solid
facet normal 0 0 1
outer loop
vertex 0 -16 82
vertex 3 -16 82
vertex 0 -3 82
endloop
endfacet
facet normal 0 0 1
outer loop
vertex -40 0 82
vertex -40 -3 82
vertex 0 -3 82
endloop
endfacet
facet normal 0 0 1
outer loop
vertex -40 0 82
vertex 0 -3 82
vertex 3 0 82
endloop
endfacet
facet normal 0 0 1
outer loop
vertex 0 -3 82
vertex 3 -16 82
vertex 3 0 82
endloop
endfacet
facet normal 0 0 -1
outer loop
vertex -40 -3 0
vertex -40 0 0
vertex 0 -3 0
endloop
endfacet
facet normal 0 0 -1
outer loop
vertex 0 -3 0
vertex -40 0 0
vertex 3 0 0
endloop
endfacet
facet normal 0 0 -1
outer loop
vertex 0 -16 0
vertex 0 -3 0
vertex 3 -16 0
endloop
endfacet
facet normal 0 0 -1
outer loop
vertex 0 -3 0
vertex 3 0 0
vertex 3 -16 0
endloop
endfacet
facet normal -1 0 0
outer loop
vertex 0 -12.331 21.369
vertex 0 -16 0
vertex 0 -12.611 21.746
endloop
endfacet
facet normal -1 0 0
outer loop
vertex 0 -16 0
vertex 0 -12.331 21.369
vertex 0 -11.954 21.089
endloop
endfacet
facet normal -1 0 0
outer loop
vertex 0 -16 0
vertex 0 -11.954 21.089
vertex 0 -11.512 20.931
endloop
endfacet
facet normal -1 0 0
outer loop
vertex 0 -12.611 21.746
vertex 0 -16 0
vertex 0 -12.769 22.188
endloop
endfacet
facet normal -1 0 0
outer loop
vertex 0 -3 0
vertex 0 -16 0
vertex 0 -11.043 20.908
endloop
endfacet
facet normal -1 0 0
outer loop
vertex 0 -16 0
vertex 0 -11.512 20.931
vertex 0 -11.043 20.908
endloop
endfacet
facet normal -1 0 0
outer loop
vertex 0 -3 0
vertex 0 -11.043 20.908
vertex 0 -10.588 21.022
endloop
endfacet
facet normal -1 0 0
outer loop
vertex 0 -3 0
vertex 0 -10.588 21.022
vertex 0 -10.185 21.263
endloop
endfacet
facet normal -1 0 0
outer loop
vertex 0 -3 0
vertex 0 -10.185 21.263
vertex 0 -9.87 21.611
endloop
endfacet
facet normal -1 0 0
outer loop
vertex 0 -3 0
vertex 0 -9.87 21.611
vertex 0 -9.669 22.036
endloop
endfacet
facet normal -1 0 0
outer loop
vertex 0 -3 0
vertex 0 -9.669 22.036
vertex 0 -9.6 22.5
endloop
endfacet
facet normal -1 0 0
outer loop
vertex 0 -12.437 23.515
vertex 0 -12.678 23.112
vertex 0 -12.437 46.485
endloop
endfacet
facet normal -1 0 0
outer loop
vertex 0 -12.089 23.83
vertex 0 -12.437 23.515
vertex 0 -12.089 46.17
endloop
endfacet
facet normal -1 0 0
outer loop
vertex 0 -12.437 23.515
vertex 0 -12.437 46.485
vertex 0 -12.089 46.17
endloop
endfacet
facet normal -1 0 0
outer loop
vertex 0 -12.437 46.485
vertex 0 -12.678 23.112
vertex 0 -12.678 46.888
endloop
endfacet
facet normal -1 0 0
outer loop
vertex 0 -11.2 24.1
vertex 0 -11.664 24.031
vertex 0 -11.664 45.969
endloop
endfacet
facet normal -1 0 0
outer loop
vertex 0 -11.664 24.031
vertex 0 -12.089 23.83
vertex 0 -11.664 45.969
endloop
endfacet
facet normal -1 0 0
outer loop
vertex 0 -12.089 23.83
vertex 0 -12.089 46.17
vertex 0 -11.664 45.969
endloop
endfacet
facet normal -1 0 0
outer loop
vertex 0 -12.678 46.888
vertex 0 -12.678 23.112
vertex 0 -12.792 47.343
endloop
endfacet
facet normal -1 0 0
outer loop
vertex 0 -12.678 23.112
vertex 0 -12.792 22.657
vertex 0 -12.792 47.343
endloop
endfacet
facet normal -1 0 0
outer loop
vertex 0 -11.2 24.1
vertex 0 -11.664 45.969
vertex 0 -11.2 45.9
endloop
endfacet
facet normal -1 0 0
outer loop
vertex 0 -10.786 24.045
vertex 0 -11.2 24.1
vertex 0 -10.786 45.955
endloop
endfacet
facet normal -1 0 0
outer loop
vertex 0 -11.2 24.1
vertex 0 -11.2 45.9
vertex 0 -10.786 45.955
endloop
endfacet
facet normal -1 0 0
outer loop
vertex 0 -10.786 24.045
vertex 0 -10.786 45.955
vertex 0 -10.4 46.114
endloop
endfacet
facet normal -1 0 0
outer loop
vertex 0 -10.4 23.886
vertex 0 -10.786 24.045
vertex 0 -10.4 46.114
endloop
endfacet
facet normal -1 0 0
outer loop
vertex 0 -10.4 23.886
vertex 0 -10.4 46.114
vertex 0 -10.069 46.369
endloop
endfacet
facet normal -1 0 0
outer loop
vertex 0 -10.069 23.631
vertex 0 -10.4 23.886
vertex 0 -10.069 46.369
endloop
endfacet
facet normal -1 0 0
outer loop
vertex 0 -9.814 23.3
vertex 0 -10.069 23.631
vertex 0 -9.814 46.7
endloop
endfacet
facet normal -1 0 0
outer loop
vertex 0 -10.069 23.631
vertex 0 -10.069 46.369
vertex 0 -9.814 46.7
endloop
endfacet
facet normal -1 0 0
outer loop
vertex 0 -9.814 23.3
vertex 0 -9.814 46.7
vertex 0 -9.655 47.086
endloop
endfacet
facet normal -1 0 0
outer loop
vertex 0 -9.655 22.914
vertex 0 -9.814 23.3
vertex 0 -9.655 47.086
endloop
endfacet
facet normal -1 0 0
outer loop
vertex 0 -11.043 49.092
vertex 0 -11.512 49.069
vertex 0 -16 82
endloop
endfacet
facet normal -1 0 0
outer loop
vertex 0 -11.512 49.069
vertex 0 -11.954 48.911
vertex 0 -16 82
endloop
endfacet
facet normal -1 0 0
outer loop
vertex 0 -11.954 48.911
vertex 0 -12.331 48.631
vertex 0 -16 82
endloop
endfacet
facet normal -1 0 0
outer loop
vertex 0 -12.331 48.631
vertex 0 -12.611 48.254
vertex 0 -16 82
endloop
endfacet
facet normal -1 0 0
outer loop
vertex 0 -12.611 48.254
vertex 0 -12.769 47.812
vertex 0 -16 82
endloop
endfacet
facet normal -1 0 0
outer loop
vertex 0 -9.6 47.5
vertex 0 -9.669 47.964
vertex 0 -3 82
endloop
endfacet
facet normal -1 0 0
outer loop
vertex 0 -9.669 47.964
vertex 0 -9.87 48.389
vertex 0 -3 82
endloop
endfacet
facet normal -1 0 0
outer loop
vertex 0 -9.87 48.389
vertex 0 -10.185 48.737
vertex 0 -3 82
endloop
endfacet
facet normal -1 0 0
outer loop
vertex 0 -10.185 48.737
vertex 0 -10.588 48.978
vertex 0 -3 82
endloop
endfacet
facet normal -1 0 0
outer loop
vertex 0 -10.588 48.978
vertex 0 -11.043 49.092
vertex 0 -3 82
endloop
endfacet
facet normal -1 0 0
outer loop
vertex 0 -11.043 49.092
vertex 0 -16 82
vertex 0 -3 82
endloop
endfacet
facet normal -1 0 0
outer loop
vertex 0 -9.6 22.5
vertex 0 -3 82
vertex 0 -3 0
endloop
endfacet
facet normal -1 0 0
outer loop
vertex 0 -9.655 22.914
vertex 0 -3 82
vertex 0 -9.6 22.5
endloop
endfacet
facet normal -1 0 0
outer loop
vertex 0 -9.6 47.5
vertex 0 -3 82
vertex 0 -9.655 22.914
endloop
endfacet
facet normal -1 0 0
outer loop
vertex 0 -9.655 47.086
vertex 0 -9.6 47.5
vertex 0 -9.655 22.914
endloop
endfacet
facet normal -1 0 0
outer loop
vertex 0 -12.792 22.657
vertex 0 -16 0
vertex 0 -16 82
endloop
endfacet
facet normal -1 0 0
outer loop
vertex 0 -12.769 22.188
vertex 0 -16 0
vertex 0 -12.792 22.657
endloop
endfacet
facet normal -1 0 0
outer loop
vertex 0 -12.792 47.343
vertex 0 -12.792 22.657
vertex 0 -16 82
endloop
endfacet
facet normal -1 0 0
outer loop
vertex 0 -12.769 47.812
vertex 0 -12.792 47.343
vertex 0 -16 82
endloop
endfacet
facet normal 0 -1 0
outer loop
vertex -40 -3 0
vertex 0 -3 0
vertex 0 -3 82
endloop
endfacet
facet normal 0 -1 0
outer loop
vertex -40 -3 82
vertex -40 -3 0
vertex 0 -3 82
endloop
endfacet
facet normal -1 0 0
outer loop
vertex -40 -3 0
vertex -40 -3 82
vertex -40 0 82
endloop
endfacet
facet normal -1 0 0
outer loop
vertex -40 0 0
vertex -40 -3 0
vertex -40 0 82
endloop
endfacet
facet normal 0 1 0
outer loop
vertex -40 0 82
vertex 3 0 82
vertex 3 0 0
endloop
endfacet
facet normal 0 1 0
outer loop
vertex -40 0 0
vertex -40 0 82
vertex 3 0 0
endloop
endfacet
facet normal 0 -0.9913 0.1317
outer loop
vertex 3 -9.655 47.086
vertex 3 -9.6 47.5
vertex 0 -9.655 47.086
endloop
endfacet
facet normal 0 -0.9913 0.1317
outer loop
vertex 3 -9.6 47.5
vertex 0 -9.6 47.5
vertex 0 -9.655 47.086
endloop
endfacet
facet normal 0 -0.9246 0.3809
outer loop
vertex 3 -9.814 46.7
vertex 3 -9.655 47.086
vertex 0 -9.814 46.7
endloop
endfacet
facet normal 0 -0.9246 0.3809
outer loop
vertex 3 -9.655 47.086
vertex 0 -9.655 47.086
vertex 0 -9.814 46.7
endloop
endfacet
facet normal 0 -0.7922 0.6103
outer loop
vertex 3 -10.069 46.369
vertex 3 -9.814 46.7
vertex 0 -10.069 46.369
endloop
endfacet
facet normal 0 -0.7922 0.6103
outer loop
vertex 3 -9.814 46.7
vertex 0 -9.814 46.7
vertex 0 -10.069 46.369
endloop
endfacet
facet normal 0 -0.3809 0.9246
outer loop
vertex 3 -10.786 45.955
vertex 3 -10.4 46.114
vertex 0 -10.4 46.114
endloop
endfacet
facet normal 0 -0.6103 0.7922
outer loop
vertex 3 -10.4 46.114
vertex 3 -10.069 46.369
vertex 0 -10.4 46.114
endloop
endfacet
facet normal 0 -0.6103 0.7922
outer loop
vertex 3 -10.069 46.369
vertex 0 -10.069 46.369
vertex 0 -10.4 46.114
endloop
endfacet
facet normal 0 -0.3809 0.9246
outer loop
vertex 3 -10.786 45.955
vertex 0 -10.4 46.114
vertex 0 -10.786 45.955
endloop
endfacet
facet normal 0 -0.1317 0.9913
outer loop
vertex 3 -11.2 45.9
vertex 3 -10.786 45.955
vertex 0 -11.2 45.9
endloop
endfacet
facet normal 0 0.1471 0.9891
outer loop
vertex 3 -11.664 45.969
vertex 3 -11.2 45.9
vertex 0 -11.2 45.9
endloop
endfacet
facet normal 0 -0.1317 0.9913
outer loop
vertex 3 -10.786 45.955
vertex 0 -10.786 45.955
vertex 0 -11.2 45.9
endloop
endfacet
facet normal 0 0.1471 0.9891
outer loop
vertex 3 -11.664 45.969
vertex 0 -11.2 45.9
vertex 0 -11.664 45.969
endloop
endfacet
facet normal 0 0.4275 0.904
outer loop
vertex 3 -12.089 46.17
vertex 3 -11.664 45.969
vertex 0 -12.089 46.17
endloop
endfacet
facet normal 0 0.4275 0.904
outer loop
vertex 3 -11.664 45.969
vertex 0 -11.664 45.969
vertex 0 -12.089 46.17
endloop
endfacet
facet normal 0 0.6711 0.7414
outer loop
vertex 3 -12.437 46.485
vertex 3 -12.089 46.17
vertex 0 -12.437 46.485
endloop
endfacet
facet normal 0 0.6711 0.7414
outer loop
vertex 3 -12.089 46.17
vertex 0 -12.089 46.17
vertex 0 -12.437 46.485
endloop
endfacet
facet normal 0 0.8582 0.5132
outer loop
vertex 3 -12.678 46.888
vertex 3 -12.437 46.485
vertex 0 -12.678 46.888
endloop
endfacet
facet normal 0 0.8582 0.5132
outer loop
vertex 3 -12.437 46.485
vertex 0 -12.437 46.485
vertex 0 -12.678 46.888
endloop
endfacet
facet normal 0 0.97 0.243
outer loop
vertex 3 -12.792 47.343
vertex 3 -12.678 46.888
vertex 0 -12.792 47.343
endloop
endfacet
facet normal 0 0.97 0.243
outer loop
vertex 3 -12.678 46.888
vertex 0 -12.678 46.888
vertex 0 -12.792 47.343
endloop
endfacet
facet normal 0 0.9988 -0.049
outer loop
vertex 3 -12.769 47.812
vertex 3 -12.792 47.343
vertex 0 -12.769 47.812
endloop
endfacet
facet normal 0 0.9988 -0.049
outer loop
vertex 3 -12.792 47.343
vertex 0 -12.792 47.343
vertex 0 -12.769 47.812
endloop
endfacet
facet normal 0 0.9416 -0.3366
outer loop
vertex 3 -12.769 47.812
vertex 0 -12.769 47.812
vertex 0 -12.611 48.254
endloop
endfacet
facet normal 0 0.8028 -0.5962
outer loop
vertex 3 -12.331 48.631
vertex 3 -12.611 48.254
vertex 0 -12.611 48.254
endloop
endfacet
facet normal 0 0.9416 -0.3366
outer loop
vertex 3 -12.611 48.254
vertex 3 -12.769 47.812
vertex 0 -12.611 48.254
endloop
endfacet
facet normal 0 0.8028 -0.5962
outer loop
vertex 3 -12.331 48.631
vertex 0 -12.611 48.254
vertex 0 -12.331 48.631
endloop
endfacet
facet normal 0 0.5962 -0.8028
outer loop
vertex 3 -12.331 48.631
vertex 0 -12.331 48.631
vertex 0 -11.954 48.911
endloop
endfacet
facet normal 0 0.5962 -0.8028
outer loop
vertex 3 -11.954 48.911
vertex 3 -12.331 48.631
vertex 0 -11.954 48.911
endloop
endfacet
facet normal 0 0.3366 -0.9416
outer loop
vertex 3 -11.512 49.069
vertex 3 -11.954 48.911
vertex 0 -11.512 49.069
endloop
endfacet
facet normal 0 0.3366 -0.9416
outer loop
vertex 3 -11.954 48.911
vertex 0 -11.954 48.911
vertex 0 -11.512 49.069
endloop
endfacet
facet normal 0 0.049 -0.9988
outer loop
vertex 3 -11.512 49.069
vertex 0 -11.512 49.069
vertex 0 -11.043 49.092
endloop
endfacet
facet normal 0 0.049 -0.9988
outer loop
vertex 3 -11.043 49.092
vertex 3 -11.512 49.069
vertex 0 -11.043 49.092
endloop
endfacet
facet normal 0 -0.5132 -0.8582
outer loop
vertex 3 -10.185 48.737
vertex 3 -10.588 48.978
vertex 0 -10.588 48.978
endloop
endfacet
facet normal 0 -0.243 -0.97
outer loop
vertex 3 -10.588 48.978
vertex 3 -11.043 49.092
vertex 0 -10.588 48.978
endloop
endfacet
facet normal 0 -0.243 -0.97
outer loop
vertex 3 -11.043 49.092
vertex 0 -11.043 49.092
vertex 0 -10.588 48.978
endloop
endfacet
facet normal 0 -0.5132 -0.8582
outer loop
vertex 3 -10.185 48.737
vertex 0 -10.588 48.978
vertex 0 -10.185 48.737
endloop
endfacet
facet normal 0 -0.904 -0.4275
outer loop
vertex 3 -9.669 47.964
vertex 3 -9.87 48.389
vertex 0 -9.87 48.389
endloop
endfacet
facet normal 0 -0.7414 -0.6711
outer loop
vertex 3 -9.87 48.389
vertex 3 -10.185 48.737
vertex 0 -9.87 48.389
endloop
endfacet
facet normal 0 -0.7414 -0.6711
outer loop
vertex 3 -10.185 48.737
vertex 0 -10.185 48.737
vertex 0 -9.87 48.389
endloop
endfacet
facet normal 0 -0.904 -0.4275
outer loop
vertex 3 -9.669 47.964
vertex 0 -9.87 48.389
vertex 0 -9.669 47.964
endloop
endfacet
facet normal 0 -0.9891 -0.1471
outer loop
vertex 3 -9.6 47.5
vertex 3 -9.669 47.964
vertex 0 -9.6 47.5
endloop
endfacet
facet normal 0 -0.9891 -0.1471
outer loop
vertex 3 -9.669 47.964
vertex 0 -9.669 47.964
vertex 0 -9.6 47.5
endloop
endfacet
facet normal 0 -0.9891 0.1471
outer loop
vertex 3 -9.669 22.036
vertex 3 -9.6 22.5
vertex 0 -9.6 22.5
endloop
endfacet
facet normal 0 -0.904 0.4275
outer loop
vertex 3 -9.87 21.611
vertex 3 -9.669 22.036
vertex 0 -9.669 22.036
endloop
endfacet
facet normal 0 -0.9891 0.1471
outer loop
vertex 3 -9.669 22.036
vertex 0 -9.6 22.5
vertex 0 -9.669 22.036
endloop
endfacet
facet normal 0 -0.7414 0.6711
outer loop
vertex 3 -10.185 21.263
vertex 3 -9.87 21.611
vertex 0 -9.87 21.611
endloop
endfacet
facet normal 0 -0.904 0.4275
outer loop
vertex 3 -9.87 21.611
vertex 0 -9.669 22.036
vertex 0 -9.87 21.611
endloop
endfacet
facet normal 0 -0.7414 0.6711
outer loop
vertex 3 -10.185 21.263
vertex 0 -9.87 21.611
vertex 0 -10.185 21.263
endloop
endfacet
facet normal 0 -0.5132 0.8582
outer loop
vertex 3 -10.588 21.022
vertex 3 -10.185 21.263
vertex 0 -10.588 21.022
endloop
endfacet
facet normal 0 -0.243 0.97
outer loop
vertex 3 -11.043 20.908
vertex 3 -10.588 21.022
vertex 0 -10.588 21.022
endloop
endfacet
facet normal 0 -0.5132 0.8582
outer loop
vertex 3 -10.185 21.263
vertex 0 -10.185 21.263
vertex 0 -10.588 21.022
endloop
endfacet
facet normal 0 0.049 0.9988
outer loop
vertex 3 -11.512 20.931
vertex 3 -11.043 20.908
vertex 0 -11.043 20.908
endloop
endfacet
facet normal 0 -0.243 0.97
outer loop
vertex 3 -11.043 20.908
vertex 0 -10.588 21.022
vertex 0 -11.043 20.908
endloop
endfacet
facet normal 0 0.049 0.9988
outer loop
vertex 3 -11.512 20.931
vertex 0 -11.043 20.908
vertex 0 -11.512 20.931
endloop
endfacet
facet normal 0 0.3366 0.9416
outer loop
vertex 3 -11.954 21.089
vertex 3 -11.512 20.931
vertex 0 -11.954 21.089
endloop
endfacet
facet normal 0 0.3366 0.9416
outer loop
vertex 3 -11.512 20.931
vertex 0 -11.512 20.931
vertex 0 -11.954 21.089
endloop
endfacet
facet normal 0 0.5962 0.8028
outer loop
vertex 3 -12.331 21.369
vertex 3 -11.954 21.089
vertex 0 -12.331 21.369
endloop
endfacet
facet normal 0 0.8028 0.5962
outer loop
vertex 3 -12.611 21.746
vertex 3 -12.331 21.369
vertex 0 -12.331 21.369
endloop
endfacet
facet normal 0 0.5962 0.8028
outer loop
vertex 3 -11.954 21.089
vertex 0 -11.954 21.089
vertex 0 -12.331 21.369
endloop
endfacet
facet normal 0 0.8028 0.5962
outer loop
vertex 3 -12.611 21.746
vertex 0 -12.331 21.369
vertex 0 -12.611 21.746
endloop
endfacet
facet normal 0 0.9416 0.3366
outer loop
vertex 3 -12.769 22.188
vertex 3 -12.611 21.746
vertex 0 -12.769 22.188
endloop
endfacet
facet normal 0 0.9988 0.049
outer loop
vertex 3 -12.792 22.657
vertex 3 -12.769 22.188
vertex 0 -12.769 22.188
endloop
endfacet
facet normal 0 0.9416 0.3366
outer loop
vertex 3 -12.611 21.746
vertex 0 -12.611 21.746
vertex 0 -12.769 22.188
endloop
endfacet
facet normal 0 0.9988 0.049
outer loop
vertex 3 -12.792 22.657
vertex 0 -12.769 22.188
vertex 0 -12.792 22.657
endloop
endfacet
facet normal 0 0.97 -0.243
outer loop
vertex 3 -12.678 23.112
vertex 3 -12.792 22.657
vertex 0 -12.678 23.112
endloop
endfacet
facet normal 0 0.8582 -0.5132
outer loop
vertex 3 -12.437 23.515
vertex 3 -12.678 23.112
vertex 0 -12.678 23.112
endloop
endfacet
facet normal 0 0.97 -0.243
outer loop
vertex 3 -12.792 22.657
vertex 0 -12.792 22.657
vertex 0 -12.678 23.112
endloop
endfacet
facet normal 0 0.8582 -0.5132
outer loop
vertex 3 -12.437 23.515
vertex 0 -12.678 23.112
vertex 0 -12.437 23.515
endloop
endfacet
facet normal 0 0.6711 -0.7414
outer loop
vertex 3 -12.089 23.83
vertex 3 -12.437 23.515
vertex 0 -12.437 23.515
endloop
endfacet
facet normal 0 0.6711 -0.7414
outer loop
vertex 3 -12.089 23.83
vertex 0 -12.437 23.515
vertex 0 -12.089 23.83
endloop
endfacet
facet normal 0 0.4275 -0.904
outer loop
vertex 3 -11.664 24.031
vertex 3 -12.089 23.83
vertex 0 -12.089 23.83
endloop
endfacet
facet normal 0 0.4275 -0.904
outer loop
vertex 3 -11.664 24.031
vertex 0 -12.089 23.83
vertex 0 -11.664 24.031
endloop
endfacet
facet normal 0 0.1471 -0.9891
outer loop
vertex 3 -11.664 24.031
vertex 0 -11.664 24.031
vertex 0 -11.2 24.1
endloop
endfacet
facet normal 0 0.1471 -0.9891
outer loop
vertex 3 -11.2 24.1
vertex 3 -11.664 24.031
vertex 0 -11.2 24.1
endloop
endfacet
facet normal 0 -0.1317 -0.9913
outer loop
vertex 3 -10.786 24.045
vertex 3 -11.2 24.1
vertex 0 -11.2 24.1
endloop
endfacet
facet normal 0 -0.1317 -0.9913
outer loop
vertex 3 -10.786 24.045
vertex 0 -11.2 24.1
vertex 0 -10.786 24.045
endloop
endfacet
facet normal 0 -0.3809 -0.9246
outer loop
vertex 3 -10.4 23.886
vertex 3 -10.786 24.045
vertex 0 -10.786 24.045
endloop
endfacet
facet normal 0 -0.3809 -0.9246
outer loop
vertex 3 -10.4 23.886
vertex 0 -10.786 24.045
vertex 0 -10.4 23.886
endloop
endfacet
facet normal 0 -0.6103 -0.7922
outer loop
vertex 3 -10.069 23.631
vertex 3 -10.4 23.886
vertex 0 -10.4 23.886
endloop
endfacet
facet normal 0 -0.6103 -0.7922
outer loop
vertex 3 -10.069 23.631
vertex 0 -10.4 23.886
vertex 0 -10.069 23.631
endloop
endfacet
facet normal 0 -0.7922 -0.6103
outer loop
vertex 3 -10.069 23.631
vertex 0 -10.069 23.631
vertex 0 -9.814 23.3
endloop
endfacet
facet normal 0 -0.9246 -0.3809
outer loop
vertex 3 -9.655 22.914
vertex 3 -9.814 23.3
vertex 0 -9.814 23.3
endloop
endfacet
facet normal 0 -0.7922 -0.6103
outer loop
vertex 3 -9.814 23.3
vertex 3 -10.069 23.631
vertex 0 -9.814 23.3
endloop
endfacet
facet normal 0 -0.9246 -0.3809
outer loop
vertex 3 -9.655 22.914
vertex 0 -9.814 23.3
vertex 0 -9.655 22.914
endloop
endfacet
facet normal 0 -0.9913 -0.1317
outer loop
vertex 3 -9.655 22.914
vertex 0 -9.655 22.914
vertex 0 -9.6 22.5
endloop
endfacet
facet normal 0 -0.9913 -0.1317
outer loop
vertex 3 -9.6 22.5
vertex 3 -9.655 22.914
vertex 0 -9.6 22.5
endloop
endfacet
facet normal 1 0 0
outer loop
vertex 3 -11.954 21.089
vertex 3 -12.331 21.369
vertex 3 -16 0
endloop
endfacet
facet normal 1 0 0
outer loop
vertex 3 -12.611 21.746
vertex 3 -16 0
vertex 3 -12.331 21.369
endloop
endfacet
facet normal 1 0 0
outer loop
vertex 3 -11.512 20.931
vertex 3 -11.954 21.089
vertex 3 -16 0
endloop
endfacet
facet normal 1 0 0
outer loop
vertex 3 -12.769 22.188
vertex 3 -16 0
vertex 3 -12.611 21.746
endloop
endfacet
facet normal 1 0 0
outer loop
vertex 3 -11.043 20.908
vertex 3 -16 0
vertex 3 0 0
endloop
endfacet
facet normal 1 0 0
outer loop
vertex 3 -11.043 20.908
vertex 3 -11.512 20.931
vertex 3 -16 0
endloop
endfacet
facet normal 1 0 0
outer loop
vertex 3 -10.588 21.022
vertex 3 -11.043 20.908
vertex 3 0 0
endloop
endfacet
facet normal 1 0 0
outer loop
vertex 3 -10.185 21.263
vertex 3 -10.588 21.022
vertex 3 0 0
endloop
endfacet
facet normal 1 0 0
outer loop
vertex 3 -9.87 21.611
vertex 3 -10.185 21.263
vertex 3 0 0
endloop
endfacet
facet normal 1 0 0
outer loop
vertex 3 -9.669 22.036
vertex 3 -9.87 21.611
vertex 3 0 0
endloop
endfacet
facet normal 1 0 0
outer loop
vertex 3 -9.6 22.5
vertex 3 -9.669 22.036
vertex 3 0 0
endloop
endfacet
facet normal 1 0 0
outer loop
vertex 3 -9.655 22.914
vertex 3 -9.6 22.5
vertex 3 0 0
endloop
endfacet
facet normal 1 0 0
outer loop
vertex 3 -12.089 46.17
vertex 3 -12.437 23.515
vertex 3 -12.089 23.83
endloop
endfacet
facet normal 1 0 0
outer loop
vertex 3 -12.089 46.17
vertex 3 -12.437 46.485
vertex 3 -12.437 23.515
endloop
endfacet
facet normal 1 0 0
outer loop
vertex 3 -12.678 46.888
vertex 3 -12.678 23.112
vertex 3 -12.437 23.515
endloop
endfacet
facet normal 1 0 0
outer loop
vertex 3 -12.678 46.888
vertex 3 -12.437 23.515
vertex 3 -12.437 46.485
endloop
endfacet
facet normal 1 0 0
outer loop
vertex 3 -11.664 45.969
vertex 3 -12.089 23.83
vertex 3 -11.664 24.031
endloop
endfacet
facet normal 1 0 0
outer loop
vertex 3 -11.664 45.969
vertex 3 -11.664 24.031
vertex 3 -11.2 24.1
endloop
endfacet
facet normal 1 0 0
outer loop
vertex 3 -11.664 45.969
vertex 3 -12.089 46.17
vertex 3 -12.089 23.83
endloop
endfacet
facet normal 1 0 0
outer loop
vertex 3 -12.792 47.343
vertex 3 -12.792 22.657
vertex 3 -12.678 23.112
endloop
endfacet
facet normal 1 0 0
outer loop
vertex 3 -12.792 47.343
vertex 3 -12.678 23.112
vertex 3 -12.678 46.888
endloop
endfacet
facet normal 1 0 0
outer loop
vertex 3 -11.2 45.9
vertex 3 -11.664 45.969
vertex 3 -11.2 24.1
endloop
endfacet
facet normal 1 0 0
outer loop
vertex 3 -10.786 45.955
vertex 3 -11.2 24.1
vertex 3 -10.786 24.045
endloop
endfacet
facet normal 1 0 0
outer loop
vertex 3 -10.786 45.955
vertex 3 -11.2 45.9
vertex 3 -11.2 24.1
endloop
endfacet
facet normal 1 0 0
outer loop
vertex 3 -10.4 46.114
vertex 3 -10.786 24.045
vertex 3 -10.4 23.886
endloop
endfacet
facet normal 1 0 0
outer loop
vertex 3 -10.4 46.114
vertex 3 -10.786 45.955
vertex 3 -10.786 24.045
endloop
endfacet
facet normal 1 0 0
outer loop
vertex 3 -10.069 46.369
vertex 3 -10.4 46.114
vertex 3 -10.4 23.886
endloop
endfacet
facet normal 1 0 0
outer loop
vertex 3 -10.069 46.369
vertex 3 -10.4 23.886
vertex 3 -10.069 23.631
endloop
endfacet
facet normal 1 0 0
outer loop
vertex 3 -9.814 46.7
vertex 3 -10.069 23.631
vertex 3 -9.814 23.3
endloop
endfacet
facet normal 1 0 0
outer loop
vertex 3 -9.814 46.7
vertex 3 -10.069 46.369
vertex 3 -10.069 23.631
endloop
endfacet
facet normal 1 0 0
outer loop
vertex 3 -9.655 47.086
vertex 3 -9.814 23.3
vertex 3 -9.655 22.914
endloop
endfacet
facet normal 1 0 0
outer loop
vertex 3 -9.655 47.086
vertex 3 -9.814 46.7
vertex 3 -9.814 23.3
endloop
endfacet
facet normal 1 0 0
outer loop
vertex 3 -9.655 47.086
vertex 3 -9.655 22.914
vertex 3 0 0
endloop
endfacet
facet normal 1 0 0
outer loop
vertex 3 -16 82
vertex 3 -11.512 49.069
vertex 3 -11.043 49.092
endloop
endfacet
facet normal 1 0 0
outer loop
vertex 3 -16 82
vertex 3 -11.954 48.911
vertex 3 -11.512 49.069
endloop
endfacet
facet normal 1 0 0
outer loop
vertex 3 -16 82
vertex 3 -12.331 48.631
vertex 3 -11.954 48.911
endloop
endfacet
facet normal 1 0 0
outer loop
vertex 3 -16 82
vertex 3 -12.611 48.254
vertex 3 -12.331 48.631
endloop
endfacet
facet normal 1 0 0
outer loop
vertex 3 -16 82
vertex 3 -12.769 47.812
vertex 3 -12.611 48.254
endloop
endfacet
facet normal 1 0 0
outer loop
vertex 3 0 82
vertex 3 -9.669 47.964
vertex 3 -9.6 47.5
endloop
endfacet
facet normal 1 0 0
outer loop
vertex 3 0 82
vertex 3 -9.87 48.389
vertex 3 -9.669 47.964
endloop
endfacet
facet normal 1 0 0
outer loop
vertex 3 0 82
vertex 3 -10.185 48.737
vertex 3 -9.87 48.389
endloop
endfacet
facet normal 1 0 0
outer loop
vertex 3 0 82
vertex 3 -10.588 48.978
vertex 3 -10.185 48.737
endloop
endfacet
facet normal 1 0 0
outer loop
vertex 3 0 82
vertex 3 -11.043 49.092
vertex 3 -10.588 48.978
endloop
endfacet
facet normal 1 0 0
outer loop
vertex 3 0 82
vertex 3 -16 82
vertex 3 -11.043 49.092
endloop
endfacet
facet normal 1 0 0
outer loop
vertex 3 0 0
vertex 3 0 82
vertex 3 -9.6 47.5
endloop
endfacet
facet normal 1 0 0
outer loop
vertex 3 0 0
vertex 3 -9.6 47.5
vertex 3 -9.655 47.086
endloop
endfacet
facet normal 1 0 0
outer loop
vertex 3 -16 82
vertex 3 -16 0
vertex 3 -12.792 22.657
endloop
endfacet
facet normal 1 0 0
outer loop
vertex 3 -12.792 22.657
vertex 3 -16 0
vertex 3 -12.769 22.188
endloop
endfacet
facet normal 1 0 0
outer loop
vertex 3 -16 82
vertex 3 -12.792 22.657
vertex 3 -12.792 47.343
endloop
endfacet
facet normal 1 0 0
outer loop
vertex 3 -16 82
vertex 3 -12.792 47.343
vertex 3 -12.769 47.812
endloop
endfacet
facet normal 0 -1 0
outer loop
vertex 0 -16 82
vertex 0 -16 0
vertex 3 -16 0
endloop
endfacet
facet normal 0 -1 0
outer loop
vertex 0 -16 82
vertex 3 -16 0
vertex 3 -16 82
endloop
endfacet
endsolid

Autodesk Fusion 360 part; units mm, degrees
sketch "스케치1" plane through (0, 0, 0) normal (1, 0, 0) x (0, 1, 0)
  line L0 (0, 0) -> (-16, 0)
  line L1 (-16, 0) -> (-16, 82)
  line L2 (-16, 82) -> (0, 82)
  line L3 (0, 82) -> (0, 0)
  line L4 (0, 0) -> (-6, 0)
  line L5 (-6, 0) -> (-6, 82)
  line L6 (-6, 82) -> (0, 82)
  line L7 (0, 82) -> (0, 0)
  line L8 (-6, 0) -> (-11.2, 0)
  line L9 (-11.2, 0) -> (-11.2, 22.5)
  line L10 (-11.2, 22.5) -> (-6, 22.5)
  line L11 (-6, 22.5) -> (-6, 0)
  circle A0 centre (-11.2, 22.5) radius 1.6
  line L12 (-11.2, 22.5) -> (-11.2, 47.5)
  circle A1 centre (-11.2, 47.5) radius 1.6
  line L13 (0, 0) -> (-3, 0)
  line L14 (-3, 0) -> (-3, 82)
  line L15 (-3, 82) -> (0, 82)
  line L16 (0, 82) -> (0, 0)
  dimension "d1" = 16
  dimension "d2" = 82
  dimension "d3" = 6
  dimension "d4" = 82
  dimension "d5" = 5.2
  dimension "d6" = 22.5
  dimension "d7" = 3.2
  dimension "d8" = 25
  dimension "d9" = 3.2
  dimension "d14" = 3
  dimension "d15" = 82
extrude "돌출1" add sketch "스케치1" along normal blind 3 contours L0 L5 L8 L9 L10 L11 A0 | L0 L1 L2 L5 L9 L10 A0
extrude "돌출2" add sketch "스케치1" along normal blind 3 contours L0 L2 L3 L4 L6 L7 L13 L14 L15 L16 | L0 L2 L4 L5 L6 L11 L14
extrude "돌출3" add sketch "스케치1" against normal blind 40 contours L0 L2 L3 L4 L6 L7 L13 L14 L15 L16
